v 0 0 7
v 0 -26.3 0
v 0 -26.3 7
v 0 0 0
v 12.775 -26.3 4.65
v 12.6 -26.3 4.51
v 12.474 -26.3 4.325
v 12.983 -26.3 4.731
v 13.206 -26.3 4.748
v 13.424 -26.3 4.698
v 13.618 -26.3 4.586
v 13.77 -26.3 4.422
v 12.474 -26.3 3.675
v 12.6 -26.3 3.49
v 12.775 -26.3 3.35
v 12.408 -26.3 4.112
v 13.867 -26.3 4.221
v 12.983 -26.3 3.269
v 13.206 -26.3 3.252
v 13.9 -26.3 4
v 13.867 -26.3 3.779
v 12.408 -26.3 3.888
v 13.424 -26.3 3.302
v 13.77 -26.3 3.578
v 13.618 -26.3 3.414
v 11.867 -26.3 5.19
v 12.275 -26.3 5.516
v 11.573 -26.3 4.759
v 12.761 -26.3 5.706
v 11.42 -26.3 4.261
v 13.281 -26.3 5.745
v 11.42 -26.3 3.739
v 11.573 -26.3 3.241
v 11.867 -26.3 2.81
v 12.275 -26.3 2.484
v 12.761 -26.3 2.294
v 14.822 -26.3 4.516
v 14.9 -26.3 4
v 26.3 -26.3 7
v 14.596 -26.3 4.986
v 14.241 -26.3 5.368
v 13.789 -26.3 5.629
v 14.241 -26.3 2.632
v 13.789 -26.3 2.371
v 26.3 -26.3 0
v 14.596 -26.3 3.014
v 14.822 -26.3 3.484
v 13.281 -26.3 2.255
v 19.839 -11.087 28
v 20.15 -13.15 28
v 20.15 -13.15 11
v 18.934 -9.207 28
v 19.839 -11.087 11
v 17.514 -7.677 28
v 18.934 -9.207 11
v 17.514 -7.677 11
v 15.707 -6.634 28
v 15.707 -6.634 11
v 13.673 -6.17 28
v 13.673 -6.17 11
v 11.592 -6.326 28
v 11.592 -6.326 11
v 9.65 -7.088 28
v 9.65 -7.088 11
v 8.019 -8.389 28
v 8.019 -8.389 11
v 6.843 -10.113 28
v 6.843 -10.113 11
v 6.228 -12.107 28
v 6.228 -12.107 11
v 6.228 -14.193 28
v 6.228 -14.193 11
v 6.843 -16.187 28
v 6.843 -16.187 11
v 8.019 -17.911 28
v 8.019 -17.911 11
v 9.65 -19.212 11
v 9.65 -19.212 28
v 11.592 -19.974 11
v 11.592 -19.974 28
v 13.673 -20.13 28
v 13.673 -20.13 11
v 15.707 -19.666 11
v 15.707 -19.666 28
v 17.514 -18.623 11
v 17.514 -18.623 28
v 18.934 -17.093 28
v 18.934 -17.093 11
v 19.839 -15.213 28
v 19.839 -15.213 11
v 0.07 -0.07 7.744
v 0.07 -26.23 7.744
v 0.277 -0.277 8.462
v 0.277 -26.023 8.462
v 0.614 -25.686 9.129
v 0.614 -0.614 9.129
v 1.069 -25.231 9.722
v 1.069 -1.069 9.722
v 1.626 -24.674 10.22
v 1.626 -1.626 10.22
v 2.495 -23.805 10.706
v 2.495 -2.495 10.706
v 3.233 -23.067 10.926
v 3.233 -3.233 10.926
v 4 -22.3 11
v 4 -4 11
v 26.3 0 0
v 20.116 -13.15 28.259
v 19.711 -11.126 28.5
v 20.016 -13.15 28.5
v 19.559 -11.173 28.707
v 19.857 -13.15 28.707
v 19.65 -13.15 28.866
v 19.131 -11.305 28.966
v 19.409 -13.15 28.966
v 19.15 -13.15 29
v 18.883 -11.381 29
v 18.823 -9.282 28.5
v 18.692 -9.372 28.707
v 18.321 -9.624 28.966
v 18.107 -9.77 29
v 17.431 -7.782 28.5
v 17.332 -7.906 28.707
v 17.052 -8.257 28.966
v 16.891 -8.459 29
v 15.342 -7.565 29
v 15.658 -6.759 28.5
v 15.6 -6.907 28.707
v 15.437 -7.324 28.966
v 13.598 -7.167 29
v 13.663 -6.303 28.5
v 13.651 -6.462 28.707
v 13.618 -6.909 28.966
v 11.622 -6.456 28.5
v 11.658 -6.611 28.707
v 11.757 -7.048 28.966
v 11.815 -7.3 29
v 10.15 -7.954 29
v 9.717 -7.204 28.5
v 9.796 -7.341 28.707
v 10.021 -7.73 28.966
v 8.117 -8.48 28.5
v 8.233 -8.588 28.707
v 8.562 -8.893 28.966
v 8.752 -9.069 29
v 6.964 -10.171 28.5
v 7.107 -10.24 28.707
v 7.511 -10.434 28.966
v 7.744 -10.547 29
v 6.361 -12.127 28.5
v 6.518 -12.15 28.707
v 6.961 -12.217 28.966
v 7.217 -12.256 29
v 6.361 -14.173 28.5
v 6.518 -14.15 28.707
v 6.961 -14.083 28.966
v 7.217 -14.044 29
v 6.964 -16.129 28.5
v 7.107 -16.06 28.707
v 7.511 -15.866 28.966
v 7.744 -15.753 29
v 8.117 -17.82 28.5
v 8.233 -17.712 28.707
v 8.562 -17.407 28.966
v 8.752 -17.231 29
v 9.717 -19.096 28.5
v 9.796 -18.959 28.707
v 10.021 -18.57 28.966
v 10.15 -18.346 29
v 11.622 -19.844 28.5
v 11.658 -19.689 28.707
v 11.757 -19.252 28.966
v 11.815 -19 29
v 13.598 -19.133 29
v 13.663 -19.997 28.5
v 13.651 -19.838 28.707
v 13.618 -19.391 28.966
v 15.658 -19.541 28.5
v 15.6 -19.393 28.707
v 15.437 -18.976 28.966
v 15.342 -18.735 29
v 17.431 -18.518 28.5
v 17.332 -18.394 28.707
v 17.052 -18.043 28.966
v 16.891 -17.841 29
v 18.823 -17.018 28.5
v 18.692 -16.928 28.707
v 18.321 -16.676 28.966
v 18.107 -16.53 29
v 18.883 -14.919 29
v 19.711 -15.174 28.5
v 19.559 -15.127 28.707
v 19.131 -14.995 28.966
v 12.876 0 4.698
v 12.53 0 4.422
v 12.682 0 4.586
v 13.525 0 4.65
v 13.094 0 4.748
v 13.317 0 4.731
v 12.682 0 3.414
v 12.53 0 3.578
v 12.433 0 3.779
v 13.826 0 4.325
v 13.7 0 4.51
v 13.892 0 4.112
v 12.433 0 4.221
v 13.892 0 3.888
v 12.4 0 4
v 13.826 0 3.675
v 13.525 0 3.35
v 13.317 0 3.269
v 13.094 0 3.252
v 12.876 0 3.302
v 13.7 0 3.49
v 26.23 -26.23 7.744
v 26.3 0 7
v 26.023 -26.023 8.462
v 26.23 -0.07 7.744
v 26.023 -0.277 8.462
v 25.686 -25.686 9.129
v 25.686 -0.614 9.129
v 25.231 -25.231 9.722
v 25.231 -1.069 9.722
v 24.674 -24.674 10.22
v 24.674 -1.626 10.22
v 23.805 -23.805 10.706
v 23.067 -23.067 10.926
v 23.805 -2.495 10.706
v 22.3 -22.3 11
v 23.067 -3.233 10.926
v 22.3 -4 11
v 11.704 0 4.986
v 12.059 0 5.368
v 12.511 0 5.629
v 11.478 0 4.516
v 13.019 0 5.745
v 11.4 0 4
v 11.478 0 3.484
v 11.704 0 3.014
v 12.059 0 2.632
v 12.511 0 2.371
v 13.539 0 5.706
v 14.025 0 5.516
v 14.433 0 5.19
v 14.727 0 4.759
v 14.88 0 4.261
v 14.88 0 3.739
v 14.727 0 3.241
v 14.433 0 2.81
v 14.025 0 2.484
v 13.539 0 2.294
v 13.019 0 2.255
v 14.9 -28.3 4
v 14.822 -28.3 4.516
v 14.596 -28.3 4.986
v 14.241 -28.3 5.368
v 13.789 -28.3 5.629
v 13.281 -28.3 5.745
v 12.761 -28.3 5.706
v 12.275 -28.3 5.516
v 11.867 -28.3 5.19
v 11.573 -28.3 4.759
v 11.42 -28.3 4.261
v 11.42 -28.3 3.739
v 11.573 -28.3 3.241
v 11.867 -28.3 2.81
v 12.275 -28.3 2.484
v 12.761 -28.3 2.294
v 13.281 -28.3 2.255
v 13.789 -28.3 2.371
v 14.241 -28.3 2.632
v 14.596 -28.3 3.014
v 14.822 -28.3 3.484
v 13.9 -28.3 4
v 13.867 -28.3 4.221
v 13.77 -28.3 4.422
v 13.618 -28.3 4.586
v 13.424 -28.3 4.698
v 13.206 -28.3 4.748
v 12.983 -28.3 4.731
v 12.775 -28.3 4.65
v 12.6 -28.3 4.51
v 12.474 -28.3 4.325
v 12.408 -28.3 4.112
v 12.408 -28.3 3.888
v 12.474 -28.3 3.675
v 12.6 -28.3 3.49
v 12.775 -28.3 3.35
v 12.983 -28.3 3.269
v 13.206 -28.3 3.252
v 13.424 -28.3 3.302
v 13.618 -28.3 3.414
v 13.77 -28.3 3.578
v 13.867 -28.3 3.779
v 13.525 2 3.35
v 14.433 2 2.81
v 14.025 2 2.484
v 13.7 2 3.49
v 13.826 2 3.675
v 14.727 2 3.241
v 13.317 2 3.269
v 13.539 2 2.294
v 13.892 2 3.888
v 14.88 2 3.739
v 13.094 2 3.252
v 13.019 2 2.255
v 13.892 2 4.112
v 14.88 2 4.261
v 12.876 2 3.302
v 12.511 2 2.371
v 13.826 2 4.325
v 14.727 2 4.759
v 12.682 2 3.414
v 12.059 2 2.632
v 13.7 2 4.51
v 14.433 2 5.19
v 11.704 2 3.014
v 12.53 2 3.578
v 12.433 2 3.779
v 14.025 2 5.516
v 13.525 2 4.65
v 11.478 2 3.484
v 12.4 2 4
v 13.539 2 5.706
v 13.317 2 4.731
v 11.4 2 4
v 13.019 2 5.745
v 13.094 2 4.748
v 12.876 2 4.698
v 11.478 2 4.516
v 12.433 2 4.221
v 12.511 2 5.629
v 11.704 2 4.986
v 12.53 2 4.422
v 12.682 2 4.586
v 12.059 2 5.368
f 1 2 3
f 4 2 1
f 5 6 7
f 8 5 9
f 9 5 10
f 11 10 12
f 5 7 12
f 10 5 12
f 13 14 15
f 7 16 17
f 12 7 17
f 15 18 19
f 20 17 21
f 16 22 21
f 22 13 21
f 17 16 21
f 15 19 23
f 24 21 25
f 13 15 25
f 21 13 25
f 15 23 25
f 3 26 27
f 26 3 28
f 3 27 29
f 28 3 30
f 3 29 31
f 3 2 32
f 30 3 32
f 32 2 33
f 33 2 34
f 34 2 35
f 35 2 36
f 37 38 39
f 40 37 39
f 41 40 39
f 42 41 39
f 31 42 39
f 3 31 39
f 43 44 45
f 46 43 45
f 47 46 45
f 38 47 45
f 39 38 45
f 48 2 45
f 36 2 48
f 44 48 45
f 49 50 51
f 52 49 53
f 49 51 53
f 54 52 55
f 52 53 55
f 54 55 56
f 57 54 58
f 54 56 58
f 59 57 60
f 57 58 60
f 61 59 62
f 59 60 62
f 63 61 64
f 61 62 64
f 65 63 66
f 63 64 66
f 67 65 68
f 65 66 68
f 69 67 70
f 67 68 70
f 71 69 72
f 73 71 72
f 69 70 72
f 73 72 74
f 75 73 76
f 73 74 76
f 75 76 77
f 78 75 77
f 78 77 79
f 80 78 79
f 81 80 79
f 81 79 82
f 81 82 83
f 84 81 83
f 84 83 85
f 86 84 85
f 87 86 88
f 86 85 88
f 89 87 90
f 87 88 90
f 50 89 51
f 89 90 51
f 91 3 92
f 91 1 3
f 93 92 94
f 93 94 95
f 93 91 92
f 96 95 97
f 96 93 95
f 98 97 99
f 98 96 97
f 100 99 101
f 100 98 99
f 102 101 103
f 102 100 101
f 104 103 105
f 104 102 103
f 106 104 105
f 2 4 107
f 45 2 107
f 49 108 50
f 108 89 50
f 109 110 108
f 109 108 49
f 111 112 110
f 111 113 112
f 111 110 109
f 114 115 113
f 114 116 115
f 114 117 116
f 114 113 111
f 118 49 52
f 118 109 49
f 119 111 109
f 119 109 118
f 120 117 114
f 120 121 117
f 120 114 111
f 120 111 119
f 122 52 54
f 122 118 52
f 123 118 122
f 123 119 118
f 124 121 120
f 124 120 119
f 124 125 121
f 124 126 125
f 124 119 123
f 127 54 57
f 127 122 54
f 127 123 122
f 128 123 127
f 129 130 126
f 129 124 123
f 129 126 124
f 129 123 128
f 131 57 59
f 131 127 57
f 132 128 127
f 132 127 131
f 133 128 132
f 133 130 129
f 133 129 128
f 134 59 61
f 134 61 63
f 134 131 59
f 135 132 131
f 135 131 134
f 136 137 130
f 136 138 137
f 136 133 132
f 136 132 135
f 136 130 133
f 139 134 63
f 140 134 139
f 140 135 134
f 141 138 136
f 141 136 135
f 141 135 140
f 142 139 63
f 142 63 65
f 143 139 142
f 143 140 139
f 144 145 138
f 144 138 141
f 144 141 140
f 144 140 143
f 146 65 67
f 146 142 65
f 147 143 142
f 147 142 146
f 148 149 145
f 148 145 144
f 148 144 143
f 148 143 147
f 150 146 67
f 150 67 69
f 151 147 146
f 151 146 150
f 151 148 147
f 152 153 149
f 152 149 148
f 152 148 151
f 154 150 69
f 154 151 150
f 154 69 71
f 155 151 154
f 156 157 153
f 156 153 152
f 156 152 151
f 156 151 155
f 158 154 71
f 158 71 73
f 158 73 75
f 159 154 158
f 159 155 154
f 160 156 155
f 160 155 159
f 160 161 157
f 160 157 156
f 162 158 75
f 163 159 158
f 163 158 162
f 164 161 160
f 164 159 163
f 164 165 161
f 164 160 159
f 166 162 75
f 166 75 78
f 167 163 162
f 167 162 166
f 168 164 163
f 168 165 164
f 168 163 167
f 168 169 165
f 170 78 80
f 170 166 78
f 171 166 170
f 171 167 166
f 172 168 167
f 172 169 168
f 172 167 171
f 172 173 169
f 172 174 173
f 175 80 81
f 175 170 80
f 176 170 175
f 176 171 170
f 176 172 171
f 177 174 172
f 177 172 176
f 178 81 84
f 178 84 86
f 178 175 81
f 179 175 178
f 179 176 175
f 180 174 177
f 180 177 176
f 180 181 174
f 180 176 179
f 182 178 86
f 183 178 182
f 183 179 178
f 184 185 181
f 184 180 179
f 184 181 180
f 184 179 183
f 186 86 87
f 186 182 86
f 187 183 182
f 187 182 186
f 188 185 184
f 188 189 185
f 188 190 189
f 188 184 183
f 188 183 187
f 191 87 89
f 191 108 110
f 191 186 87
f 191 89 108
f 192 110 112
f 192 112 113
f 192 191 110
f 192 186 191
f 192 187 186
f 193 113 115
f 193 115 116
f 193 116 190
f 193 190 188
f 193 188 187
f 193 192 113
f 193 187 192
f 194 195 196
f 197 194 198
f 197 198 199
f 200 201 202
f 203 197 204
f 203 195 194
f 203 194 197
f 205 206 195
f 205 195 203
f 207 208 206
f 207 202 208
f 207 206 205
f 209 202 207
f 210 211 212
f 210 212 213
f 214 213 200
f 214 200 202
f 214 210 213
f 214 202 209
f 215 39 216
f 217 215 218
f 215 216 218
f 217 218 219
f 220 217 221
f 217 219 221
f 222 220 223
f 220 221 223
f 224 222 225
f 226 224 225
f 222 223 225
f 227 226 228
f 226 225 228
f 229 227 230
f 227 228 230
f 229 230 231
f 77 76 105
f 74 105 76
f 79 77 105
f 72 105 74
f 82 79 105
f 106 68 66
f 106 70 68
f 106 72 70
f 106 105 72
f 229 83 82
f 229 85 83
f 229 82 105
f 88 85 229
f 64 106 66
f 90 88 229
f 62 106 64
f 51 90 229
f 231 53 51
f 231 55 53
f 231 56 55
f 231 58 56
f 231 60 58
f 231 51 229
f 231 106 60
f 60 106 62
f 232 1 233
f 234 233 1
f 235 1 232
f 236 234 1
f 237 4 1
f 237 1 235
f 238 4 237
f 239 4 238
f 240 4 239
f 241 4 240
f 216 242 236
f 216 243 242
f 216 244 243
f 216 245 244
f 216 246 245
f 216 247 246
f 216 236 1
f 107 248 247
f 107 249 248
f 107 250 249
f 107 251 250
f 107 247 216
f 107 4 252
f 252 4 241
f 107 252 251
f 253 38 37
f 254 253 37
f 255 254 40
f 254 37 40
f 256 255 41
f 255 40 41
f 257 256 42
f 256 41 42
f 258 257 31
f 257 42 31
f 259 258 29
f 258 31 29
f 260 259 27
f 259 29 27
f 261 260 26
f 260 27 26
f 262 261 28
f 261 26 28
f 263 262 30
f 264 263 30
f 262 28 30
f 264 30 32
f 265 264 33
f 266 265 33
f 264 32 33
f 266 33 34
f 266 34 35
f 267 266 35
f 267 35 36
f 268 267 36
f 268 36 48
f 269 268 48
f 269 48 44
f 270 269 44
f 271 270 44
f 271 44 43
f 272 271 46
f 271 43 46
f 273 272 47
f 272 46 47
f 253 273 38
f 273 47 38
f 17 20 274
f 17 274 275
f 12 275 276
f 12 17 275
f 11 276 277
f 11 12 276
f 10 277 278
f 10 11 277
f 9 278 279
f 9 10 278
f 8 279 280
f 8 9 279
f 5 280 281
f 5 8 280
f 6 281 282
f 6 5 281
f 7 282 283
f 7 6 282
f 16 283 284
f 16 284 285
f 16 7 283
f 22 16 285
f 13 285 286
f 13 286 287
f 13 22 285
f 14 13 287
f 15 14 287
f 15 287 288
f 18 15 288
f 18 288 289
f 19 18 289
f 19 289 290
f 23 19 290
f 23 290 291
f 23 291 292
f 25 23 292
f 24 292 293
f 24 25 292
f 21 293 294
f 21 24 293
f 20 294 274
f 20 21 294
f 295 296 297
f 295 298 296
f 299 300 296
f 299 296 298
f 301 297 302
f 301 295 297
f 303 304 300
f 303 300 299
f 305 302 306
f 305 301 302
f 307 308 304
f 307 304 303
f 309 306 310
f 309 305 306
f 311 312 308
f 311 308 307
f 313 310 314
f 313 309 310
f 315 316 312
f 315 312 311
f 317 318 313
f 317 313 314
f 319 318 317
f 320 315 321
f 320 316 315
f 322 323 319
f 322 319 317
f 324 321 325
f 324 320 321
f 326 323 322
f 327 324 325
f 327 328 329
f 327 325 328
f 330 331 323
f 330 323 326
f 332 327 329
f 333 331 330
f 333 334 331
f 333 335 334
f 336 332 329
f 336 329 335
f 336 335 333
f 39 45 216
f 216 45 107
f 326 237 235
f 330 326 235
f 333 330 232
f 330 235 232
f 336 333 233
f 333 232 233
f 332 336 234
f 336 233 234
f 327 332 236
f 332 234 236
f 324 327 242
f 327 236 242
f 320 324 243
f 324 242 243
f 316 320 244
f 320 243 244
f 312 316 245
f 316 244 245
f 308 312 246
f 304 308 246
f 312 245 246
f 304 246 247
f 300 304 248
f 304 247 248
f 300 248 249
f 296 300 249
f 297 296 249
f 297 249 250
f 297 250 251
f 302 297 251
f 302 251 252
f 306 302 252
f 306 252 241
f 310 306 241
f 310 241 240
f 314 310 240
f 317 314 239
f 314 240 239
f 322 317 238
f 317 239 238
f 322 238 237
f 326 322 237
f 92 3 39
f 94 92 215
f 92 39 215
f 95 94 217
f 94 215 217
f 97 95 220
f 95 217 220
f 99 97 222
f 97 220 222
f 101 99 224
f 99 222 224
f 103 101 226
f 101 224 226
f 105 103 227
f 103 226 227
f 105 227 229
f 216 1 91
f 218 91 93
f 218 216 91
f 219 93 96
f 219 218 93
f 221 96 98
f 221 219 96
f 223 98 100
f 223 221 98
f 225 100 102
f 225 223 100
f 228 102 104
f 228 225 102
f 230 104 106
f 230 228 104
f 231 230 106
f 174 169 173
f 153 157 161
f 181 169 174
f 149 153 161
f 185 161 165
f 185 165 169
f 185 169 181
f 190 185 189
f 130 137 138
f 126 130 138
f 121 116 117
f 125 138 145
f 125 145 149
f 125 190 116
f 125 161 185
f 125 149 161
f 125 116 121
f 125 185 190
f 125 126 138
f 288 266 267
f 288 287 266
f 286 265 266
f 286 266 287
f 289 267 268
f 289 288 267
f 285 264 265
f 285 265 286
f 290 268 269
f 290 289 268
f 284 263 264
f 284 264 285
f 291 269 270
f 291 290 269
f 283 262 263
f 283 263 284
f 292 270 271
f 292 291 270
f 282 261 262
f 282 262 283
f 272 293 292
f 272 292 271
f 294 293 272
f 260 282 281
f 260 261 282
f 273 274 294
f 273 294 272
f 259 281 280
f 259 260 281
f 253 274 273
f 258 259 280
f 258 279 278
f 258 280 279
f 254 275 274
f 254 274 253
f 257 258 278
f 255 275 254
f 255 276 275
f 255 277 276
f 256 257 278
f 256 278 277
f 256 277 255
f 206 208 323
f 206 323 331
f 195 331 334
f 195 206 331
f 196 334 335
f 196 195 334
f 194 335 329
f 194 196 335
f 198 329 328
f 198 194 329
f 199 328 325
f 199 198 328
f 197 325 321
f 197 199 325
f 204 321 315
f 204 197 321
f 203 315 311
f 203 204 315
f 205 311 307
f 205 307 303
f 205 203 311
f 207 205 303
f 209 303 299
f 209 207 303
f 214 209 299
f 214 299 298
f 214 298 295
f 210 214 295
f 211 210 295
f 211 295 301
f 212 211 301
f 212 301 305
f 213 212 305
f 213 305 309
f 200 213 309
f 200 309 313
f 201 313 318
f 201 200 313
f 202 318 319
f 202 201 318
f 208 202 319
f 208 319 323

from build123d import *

# Parameters (mm, degrees)
F0_W     = 26.3
F0_H     = 26.3
F1_DEPTH = 11
F2_R     = 4
F3_R     = 7
F4_DEPTH = 18
F5_R     = 1.75
F5_R_2   = 0.75
F6_DEPTH = 2
F7_R     = 1.75
F7_R_2   = 0.75
F8_DEPTH = 2
F9_R     = 1


with BuildPart() as f1:
    # F0 (on Top) → F1 (new body)
    with BuildSketch(Plane.XY):
        with Locations((13.15, -13.15)):
            Rectangle(F0_W, F0_H)
    extrude(amount=F1_DEPTH)

    # F2
    f2_edges = [f1.edges().sort_by_distance(p)[0] for p in [
        (13.15, -26.3, 11),
        (0, -13.15, 11),
        (26.3, -13.15, 11),
        (13.15, 0, 11),
    ]]
    fillet(f2_edges, radius=F2_R)

    # F3 (on face) → F4 (join)
    with BuildSketch(Plane.XY.offset(11)):
        with Locations((13.15, -13.15)):
            Circle(F3_R)
    extrude(amount=F4_DEPTH)

    # F5 (on face) → F6 (join)
    with BuildSketch(Plane.XZ.offset(26.3)):
        with Locations((13.15, 4)):
            Circle(F5_R)
        with Locations((13.15, 4)):
            Circle(F5_R_2, mode=Mode.SUBTRACT)
    extrude(amount=F6_DEPTH)

    # F7 (on face) → F8 (join)
    with BuildSketch(Plane(origin=(0, 0, 0), x_dir=(-1, 0, 0), z_dir=(0, 1, 0))):
        with Locations((-13.15, 4)):
            Circle(F7_R)
        with Locations((-13.15, 4)):
            Circle(F7_R_2, mode=Mode.SUBTRACT)
    extrude(amount=F8_DEPTH)

    # F9
    f9_edges = [f1.edges().sort_by_distance(p)[0] for p in [
        (6.15, -13.15, 29),
    ]]
    fillet(f9_edges, radius=F9_R)


solid = f1.part
